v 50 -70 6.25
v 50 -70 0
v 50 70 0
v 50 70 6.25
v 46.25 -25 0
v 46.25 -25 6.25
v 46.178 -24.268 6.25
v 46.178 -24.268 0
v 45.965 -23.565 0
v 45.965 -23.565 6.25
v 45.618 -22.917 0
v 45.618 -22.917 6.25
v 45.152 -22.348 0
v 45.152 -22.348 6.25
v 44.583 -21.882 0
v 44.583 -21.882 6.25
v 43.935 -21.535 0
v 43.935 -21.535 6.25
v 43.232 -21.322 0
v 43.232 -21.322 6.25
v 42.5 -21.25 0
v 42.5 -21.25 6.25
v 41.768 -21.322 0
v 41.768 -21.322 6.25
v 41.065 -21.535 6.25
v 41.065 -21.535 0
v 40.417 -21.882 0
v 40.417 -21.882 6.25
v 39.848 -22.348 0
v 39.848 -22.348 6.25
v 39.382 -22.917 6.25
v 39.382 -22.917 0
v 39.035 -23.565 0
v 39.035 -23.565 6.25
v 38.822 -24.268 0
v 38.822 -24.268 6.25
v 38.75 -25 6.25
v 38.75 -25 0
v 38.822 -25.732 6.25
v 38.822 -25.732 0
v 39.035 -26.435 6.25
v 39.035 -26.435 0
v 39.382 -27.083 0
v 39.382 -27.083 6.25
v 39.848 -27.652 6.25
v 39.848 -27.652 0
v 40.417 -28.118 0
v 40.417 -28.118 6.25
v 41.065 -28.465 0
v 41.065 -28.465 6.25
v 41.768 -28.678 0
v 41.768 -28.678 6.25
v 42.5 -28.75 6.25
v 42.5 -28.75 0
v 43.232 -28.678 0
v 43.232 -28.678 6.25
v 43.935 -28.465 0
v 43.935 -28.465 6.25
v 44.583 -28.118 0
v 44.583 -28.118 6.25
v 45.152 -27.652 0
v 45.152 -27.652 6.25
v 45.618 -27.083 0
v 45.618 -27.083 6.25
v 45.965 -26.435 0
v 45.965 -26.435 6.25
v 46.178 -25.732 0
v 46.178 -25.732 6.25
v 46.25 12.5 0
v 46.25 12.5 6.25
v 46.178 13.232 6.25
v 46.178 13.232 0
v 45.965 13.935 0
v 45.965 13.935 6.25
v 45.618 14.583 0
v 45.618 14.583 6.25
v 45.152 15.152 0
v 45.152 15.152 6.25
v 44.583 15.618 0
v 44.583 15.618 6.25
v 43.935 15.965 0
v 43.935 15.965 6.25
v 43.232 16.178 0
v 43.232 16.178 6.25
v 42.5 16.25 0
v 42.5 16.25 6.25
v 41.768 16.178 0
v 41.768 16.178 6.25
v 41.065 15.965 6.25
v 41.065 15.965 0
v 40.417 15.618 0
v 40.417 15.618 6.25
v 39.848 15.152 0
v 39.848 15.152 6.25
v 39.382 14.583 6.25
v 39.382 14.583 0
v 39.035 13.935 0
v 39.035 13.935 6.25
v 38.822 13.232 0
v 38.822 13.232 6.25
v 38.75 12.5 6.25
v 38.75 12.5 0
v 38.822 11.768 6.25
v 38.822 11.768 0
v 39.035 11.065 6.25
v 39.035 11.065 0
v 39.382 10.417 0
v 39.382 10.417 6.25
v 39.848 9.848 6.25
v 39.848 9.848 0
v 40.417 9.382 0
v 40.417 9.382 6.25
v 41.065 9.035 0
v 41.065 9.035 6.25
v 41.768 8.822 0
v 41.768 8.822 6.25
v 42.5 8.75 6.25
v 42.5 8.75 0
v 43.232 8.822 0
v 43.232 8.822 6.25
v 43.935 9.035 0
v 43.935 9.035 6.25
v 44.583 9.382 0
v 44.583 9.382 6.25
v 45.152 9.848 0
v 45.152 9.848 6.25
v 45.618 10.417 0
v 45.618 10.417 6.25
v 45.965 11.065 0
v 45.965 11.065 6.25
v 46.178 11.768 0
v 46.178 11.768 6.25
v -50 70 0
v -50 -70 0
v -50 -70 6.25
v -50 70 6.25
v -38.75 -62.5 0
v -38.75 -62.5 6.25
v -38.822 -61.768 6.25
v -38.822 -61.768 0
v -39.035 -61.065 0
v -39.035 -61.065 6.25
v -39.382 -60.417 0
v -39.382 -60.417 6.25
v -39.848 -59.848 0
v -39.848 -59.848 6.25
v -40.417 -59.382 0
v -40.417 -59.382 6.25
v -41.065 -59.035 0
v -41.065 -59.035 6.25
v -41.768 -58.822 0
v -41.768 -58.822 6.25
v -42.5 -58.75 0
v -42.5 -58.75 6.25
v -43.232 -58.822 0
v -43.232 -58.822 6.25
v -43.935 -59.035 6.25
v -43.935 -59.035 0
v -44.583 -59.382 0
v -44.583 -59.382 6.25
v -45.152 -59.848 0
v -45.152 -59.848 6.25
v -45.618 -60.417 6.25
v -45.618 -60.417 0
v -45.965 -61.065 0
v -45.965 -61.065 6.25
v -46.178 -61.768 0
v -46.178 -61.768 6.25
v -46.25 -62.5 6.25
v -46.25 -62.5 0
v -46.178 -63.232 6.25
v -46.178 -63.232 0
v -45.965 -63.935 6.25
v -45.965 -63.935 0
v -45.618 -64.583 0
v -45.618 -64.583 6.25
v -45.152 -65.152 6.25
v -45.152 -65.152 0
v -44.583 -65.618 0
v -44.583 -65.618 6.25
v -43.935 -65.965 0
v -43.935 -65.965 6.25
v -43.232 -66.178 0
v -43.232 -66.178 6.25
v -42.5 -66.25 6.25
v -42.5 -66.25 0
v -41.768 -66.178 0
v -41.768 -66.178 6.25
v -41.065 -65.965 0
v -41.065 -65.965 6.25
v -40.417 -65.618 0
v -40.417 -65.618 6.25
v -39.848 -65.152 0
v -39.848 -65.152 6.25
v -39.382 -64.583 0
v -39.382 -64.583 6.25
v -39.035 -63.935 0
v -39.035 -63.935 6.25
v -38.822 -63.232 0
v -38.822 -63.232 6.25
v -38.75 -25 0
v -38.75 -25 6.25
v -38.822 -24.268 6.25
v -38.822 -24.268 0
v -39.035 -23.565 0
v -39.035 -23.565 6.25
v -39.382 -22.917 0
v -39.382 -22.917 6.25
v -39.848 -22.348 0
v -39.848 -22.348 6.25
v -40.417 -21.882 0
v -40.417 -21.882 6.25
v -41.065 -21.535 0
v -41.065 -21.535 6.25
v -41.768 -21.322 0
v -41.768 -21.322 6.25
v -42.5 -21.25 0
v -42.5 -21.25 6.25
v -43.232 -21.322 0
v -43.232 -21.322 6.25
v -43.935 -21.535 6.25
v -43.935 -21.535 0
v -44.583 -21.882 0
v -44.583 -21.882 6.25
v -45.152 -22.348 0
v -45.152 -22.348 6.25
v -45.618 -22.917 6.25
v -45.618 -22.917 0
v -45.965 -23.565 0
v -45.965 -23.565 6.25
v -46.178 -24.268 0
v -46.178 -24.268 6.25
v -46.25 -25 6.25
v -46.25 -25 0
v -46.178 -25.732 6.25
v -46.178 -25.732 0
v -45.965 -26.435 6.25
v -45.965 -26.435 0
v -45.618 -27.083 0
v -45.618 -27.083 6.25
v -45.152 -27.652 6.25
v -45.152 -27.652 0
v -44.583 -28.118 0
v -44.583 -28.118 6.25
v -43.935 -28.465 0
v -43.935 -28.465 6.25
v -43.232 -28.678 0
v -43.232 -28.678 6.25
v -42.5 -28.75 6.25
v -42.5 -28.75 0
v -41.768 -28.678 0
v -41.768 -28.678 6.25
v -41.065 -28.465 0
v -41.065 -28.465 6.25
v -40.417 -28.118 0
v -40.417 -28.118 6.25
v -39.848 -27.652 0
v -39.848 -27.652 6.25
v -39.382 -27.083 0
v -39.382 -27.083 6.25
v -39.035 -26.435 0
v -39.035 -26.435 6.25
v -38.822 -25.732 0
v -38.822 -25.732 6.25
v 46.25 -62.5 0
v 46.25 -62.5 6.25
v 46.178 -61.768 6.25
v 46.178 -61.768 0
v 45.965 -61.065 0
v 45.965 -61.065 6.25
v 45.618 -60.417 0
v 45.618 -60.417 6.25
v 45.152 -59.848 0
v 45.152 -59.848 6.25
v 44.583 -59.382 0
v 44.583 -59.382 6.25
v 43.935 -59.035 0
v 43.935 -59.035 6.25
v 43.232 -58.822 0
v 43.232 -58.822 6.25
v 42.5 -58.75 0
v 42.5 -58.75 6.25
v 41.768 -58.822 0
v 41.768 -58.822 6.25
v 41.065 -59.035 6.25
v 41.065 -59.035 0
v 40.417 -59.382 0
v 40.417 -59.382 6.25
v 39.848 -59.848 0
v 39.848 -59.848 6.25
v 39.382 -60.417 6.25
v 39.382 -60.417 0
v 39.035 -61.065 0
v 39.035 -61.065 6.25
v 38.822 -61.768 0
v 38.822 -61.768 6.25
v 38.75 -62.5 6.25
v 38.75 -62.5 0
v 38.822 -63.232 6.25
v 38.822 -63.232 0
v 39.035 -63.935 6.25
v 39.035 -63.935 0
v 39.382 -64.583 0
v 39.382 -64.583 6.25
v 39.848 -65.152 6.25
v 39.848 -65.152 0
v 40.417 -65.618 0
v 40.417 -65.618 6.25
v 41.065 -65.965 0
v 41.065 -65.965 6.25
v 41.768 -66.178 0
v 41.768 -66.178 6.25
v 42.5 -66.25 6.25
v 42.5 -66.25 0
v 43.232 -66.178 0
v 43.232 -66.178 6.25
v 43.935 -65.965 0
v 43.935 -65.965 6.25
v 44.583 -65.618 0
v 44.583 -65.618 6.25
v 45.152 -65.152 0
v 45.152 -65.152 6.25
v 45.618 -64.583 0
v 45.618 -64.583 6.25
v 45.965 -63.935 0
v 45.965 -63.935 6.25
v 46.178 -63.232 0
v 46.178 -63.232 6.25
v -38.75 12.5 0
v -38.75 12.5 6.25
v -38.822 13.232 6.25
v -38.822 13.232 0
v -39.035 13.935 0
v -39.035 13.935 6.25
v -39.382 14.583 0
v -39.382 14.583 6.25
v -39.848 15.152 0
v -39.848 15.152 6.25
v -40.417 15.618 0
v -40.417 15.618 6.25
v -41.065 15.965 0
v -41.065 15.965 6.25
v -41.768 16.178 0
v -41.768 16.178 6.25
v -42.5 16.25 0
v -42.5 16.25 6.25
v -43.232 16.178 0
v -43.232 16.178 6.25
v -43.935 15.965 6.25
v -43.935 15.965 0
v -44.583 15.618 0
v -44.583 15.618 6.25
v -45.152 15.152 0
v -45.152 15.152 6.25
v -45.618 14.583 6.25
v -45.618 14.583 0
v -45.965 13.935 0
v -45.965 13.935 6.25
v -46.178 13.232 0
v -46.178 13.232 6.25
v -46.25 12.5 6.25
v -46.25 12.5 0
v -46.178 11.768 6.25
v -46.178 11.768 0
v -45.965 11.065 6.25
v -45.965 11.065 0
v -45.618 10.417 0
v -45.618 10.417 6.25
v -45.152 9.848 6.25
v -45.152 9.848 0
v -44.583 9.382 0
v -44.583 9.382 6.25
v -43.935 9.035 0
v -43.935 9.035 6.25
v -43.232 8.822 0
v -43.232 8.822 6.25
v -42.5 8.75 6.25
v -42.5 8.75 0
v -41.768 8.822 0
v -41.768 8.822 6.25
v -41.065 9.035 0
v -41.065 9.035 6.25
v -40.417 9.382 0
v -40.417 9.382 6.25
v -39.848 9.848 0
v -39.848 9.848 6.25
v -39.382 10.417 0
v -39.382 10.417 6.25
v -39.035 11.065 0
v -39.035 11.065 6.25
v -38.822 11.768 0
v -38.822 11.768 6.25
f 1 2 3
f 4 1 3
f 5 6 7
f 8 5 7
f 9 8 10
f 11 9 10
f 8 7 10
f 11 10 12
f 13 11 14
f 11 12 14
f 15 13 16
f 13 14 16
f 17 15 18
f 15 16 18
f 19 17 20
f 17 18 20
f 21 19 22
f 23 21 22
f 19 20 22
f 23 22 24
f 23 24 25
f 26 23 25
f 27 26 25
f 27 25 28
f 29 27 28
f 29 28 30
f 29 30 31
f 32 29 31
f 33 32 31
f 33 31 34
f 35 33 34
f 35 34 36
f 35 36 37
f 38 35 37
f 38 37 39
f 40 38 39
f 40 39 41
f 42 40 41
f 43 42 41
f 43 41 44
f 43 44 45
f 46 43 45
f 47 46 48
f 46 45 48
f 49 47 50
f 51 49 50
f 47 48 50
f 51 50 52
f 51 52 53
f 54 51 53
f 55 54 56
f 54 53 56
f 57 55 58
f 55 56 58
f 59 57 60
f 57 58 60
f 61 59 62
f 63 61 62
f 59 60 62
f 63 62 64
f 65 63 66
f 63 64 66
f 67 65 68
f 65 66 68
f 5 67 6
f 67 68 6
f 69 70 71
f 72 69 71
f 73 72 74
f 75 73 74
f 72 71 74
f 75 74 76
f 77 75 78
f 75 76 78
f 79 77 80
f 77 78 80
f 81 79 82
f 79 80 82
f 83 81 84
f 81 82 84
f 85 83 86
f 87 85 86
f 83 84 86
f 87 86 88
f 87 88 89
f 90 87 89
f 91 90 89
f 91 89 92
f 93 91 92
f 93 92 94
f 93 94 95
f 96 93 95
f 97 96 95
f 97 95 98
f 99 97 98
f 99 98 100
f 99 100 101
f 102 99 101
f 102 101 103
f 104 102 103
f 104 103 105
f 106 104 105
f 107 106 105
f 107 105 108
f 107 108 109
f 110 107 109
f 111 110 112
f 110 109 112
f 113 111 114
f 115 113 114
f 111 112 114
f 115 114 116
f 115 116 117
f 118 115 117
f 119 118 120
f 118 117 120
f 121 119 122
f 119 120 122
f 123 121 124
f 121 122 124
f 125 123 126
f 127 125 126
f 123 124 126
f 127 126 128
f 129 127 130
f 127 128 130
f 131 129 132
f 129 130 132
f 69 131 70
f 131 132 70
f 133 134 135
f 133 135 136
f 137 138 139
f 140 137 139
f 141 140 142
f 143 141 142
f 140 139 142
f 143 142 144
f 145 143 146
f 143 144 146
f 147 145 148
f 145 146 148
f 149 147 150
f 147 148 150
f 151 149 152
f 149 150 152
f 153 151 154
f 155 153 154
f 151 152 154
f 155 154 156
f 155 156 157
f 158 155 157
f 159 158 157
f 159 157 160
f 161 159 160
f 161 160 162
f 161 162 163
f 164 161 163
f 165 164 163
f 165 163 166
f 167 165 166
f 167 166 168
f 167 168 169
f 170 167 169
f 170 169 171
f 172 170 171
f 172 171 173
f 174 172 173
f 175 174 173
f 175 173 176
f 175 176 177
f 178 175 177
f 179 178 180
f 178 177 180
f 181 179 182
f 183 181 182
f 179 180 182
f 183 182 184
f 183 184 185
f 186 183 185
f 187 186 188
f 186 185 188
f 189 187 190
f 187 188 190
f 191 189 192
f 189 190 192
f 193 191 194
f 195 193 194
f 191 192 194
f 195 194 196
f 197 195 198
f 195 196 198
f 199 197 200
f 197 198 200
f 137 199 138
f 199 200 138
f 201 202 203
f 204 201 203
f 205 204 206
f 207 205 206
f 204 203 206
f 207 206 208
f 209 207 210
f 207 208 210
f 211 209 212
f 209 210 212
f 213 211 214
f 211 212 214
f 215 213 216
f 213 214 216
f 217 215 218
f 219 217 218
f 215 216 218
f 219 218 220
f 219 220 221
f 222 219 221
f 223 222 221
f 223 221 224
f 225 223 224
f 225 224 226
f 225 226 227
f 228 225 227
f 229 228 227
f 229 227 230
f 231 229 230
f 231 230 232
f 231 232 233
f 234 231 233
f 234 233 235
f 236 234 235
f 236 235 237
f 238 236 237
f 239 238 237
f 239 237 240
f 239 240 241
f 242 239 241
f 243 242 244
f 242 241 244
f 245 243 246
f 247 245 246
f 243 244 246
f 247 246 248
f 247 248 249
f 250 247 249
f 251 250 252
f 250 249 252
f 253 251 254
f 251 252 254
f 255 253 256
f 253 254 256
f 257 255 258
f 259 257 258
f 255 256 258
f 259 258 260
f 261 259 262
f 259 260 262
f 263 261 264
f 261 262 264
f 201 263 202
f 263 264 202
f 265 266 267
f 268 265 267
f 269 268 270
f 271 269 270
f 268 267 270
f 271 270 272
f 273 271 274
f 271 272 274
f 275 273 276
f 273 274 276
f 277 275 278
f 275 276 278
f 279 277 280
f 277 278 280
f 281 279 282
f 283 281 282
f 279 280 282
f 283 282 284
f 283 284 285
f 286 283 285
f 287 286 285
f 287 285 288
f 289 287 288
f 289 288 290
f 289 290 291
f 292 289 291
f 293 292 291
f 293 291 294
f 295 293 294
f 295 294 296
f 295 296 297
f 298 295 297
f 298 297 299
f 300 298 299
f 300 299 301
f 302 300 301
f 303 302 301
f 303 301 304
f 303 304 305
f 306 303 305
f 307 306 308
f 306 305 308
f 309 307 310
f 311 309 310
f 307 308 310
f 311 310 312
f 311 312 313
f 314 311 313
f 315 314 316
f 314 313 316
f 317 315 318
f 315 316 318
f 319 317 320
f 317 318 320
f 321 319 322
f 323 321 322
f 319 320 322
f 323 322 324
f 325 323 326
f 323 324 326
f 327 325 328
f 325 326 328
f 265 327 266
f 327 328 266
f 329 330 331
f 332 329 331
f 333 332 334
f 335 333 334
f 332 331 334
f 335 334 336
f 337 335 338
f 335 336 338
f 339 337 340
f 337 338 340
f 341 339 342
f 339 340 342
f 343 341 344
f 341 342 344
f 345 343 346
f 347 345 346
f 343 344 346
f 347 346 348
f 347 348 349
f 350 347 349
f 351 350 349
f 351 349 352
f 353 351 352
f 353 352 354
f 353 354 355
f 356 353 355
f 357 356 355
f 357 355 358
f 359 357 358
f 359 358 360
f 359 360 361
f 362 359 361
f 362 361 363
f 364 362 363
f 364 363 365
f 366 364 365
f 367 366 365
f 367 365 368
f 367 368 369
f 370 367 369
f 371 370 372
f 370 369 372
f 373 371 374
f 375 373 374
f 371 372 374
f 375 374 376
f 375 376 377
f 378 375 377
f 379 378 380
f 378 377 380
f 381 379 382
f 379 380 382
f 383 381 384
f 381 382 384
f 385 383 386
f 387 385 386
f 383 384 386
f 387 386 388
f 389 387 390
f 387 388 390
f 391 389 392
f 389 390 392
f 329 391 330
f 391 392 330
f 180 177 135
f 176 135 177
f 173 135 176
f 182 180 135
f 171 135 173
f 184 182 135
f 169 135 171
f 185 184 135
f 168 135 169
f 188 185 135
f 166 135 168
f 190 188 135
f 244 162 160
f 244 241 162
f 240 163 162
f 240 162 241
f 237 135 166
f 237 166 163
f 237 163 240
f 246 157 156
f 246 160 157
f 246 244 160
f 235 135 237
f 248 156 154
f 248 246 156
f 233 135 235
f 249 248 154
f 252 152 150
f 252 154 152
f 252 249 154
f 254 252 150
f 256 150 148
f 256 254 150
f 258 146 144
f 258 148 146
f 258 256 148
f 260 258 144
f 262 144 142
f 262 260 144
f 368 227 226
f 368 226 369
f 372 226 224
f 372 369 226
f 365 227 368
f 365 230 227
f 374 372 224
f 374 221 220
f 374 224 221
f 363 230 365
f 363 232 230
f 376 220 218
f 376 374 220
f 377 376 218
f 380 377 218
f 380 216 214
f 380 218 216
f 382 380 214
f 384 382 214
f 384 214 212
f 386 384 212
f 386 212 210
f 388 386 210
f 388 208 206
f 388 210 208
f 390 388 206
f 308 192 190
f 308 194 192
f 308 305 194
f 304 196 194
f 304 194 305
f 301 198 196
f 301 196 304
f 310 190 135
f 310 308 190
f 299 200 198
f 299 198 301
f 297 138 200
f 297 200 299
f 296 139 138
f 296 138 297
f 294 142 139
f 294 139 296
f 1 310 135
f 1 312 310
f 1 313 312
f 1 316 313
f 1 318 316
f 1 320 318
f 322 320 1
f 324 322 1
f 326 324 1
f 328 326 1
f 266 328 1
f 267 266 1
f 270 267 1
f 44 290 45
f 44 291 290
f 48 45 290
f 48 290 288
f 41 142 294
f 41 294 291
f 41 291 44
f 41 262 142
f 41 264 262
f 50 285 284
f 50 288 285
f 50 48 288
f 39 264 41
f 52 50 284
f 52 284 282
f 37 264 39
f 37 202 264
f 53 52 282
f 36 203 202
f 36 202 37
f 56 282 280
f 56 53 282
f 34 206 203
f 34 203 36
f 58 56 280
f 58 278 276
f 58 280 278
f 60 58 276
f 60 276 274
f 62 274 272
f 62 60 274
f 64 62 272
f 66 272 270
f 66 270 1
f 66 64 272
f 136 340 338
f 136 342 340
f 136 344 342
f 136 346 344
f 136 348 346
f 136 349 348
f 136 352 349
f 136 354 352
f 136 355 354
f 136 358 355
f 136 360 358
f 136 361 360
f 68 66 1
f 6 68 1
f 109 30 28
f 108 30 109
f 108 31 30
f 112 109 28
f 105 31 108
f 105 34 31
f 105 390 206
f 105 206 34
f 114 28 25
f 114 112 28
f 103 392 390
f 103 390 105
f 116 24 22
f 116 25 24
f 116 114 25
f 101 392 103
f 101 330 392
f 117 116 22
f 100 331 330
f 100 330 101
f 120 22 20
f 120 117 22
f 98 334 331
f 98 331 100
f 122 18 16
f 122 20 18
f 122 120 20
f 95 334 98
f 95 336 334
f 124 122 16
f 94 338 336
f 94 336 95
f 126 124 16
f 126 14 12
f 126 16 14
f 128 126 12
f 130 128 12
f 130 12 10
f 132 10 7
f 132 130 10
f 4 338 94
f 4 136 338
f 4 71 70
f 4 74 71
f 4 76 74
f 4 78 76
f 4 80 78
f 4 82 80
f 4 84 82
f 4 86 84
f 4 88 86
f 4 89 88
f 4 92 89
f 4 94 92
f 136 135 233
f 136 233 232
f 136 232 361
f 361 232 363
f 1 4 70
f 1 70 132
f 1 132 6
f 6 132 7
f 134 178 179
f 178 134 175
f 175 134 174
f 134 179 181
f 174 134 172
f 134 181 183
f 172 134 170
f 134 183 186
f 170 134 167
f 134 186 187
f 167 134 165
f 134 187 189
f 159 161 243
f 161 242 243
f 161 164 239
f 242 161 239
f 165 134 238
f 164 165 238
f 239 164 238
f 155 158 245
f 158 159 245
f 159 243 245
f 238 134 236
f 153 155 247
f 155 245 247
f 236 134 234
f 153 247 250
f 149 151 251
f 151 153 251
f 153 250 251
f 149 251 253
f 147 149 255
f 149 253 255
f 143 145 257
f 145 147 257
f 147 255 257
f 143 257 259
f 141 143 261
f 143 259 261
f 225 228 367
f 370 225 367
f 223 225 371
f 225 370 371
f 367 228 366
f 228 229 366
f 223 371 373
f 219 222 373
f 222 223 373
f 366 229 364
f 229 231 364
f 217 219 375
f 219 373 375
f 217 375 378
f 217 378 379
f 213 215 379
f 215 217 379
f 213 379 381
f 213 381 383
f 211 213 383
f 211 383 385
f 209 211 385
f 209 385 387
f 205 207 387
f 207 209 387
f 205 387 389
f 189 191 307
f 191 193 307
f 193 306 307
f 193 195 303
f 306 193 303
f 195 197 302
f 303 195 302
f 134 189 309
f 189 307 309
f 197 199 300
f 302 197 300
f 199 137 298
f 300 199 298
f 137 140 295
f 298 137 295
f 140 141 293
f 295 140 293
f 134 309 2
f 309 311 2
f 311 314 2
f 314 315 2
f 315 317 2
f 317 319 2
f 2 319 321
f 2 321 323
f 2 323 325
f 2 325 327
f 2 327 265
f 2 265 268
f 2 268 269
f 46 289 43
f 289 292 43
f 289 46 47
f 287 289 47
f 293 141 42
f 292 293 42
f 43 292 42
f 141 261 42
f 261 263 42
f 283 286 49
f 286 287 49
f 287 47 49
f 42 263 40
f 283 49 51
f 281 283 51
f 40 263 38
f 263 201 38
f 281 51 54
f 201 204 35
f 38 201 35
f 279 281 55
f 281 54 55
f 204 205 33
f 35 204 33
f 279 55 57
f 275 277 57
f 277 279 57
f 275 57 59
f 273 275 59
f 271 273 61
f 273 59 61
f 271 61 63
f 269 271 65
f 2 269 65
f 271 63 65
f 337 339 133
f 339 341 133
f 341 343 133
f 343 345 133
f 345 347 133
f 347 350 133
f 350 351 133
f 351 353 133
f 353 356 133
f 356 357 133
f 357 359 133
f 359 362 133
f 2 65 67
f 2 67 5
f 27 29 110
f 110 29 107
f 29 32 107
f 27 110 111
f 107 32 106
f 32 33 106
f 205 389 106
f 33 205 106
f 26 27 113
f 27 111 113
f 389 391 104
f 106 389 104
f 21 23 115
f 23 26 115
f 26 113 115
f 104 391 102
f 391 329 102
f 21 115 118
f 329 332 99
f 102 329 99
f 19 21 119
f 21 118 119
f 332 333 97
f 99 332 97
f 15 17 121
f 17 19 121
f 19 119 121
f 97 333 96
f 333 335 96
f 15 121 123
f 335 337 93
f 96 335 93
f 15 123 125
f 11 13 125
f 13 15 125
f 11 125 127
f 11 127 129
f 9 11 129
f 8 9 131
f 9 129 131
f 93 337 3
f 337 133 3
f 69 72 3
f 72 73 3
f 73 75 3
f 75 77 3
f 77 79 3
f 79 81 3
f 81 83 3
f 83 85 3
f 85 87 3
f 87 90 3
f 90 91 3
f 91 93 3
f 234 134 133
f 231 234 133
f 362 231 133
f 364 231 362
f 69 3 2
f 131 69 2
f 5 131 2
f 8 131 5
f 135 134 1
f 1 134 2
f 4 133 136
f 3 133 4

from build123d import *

# Parameters (mm, degrees)
F0_W     = 100
F0_H     = 140
F1_DEPTH = 6.25
F2_R     = 3.75
F3_DEPTH = 25


with BuildPart() as f1:
    # F0 (on Top) → F1 (new body)
    with BuildSketch(Plane.XY):
        Rectangle(F0_W, F0_H)
    extrude(amount=F1_DEPTH)

    # F2 (on face) → F3 (cut)
    with BuildSketch(Plane.XY.offset(6.25)):
        with Locations((-42.5, -62.5)):
            Circle(F2_R)
        with Locations((-42.5, -25)):
            Circle(F2_R)
        with Locations((-42.5, 12.5)):
            Circle(F2_R)
        with Locations((42.5, 12.5)):
            Circle(F2_R)
        with Locations((42.5, -62.5)):
            Circle(F2_R)
        with Locations((42.5, -25)):
            Circle(F2_R)
    extrude(amount=-F3_DEPTH, mode=Mode.SUBTRACT)


solid = f1.part
